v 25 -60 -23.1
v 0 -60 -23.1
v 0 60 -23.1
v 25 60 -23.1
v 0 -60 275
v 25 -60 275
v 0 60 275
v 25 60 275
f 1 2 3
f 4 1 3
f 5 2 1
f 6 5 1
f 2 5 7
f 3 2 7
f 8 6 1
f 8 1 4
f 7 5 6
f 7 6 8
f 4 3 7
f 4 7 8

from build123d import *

# Parameters (mm, degrees)
F0_W     = 120
F0_H     = 50
F1_DEPTH = 25
F2_DEPTH = 250
F3_DEPTH = 1.9


with BuildPart() as f1:
    # F0 (on Right) → F1 (new body)
    with BuildSketch(Plane.YZ):
        Rectangle(F0_W, F0_H)
    extrude(amount=F1_DEPTH)

    # F2 (add): a face of the model
    f2_faces = [f1.faces().sort_by_distance(p)[0] for p in [
        (12.5, 0, 25),
    ]]
    extrude(f2_faces, amount=F2_DEPTH)

    # F3 (cut): a face of the model
    f3_faces = [f1.faces().sort_by_distance(p)[0] for p in [
        (12.5, 0, -25),
    ]]
    extrude(f3_faces, amount=-F3_DEPTH, mode=Mode.SUBTRACT)


solid = f1.part
